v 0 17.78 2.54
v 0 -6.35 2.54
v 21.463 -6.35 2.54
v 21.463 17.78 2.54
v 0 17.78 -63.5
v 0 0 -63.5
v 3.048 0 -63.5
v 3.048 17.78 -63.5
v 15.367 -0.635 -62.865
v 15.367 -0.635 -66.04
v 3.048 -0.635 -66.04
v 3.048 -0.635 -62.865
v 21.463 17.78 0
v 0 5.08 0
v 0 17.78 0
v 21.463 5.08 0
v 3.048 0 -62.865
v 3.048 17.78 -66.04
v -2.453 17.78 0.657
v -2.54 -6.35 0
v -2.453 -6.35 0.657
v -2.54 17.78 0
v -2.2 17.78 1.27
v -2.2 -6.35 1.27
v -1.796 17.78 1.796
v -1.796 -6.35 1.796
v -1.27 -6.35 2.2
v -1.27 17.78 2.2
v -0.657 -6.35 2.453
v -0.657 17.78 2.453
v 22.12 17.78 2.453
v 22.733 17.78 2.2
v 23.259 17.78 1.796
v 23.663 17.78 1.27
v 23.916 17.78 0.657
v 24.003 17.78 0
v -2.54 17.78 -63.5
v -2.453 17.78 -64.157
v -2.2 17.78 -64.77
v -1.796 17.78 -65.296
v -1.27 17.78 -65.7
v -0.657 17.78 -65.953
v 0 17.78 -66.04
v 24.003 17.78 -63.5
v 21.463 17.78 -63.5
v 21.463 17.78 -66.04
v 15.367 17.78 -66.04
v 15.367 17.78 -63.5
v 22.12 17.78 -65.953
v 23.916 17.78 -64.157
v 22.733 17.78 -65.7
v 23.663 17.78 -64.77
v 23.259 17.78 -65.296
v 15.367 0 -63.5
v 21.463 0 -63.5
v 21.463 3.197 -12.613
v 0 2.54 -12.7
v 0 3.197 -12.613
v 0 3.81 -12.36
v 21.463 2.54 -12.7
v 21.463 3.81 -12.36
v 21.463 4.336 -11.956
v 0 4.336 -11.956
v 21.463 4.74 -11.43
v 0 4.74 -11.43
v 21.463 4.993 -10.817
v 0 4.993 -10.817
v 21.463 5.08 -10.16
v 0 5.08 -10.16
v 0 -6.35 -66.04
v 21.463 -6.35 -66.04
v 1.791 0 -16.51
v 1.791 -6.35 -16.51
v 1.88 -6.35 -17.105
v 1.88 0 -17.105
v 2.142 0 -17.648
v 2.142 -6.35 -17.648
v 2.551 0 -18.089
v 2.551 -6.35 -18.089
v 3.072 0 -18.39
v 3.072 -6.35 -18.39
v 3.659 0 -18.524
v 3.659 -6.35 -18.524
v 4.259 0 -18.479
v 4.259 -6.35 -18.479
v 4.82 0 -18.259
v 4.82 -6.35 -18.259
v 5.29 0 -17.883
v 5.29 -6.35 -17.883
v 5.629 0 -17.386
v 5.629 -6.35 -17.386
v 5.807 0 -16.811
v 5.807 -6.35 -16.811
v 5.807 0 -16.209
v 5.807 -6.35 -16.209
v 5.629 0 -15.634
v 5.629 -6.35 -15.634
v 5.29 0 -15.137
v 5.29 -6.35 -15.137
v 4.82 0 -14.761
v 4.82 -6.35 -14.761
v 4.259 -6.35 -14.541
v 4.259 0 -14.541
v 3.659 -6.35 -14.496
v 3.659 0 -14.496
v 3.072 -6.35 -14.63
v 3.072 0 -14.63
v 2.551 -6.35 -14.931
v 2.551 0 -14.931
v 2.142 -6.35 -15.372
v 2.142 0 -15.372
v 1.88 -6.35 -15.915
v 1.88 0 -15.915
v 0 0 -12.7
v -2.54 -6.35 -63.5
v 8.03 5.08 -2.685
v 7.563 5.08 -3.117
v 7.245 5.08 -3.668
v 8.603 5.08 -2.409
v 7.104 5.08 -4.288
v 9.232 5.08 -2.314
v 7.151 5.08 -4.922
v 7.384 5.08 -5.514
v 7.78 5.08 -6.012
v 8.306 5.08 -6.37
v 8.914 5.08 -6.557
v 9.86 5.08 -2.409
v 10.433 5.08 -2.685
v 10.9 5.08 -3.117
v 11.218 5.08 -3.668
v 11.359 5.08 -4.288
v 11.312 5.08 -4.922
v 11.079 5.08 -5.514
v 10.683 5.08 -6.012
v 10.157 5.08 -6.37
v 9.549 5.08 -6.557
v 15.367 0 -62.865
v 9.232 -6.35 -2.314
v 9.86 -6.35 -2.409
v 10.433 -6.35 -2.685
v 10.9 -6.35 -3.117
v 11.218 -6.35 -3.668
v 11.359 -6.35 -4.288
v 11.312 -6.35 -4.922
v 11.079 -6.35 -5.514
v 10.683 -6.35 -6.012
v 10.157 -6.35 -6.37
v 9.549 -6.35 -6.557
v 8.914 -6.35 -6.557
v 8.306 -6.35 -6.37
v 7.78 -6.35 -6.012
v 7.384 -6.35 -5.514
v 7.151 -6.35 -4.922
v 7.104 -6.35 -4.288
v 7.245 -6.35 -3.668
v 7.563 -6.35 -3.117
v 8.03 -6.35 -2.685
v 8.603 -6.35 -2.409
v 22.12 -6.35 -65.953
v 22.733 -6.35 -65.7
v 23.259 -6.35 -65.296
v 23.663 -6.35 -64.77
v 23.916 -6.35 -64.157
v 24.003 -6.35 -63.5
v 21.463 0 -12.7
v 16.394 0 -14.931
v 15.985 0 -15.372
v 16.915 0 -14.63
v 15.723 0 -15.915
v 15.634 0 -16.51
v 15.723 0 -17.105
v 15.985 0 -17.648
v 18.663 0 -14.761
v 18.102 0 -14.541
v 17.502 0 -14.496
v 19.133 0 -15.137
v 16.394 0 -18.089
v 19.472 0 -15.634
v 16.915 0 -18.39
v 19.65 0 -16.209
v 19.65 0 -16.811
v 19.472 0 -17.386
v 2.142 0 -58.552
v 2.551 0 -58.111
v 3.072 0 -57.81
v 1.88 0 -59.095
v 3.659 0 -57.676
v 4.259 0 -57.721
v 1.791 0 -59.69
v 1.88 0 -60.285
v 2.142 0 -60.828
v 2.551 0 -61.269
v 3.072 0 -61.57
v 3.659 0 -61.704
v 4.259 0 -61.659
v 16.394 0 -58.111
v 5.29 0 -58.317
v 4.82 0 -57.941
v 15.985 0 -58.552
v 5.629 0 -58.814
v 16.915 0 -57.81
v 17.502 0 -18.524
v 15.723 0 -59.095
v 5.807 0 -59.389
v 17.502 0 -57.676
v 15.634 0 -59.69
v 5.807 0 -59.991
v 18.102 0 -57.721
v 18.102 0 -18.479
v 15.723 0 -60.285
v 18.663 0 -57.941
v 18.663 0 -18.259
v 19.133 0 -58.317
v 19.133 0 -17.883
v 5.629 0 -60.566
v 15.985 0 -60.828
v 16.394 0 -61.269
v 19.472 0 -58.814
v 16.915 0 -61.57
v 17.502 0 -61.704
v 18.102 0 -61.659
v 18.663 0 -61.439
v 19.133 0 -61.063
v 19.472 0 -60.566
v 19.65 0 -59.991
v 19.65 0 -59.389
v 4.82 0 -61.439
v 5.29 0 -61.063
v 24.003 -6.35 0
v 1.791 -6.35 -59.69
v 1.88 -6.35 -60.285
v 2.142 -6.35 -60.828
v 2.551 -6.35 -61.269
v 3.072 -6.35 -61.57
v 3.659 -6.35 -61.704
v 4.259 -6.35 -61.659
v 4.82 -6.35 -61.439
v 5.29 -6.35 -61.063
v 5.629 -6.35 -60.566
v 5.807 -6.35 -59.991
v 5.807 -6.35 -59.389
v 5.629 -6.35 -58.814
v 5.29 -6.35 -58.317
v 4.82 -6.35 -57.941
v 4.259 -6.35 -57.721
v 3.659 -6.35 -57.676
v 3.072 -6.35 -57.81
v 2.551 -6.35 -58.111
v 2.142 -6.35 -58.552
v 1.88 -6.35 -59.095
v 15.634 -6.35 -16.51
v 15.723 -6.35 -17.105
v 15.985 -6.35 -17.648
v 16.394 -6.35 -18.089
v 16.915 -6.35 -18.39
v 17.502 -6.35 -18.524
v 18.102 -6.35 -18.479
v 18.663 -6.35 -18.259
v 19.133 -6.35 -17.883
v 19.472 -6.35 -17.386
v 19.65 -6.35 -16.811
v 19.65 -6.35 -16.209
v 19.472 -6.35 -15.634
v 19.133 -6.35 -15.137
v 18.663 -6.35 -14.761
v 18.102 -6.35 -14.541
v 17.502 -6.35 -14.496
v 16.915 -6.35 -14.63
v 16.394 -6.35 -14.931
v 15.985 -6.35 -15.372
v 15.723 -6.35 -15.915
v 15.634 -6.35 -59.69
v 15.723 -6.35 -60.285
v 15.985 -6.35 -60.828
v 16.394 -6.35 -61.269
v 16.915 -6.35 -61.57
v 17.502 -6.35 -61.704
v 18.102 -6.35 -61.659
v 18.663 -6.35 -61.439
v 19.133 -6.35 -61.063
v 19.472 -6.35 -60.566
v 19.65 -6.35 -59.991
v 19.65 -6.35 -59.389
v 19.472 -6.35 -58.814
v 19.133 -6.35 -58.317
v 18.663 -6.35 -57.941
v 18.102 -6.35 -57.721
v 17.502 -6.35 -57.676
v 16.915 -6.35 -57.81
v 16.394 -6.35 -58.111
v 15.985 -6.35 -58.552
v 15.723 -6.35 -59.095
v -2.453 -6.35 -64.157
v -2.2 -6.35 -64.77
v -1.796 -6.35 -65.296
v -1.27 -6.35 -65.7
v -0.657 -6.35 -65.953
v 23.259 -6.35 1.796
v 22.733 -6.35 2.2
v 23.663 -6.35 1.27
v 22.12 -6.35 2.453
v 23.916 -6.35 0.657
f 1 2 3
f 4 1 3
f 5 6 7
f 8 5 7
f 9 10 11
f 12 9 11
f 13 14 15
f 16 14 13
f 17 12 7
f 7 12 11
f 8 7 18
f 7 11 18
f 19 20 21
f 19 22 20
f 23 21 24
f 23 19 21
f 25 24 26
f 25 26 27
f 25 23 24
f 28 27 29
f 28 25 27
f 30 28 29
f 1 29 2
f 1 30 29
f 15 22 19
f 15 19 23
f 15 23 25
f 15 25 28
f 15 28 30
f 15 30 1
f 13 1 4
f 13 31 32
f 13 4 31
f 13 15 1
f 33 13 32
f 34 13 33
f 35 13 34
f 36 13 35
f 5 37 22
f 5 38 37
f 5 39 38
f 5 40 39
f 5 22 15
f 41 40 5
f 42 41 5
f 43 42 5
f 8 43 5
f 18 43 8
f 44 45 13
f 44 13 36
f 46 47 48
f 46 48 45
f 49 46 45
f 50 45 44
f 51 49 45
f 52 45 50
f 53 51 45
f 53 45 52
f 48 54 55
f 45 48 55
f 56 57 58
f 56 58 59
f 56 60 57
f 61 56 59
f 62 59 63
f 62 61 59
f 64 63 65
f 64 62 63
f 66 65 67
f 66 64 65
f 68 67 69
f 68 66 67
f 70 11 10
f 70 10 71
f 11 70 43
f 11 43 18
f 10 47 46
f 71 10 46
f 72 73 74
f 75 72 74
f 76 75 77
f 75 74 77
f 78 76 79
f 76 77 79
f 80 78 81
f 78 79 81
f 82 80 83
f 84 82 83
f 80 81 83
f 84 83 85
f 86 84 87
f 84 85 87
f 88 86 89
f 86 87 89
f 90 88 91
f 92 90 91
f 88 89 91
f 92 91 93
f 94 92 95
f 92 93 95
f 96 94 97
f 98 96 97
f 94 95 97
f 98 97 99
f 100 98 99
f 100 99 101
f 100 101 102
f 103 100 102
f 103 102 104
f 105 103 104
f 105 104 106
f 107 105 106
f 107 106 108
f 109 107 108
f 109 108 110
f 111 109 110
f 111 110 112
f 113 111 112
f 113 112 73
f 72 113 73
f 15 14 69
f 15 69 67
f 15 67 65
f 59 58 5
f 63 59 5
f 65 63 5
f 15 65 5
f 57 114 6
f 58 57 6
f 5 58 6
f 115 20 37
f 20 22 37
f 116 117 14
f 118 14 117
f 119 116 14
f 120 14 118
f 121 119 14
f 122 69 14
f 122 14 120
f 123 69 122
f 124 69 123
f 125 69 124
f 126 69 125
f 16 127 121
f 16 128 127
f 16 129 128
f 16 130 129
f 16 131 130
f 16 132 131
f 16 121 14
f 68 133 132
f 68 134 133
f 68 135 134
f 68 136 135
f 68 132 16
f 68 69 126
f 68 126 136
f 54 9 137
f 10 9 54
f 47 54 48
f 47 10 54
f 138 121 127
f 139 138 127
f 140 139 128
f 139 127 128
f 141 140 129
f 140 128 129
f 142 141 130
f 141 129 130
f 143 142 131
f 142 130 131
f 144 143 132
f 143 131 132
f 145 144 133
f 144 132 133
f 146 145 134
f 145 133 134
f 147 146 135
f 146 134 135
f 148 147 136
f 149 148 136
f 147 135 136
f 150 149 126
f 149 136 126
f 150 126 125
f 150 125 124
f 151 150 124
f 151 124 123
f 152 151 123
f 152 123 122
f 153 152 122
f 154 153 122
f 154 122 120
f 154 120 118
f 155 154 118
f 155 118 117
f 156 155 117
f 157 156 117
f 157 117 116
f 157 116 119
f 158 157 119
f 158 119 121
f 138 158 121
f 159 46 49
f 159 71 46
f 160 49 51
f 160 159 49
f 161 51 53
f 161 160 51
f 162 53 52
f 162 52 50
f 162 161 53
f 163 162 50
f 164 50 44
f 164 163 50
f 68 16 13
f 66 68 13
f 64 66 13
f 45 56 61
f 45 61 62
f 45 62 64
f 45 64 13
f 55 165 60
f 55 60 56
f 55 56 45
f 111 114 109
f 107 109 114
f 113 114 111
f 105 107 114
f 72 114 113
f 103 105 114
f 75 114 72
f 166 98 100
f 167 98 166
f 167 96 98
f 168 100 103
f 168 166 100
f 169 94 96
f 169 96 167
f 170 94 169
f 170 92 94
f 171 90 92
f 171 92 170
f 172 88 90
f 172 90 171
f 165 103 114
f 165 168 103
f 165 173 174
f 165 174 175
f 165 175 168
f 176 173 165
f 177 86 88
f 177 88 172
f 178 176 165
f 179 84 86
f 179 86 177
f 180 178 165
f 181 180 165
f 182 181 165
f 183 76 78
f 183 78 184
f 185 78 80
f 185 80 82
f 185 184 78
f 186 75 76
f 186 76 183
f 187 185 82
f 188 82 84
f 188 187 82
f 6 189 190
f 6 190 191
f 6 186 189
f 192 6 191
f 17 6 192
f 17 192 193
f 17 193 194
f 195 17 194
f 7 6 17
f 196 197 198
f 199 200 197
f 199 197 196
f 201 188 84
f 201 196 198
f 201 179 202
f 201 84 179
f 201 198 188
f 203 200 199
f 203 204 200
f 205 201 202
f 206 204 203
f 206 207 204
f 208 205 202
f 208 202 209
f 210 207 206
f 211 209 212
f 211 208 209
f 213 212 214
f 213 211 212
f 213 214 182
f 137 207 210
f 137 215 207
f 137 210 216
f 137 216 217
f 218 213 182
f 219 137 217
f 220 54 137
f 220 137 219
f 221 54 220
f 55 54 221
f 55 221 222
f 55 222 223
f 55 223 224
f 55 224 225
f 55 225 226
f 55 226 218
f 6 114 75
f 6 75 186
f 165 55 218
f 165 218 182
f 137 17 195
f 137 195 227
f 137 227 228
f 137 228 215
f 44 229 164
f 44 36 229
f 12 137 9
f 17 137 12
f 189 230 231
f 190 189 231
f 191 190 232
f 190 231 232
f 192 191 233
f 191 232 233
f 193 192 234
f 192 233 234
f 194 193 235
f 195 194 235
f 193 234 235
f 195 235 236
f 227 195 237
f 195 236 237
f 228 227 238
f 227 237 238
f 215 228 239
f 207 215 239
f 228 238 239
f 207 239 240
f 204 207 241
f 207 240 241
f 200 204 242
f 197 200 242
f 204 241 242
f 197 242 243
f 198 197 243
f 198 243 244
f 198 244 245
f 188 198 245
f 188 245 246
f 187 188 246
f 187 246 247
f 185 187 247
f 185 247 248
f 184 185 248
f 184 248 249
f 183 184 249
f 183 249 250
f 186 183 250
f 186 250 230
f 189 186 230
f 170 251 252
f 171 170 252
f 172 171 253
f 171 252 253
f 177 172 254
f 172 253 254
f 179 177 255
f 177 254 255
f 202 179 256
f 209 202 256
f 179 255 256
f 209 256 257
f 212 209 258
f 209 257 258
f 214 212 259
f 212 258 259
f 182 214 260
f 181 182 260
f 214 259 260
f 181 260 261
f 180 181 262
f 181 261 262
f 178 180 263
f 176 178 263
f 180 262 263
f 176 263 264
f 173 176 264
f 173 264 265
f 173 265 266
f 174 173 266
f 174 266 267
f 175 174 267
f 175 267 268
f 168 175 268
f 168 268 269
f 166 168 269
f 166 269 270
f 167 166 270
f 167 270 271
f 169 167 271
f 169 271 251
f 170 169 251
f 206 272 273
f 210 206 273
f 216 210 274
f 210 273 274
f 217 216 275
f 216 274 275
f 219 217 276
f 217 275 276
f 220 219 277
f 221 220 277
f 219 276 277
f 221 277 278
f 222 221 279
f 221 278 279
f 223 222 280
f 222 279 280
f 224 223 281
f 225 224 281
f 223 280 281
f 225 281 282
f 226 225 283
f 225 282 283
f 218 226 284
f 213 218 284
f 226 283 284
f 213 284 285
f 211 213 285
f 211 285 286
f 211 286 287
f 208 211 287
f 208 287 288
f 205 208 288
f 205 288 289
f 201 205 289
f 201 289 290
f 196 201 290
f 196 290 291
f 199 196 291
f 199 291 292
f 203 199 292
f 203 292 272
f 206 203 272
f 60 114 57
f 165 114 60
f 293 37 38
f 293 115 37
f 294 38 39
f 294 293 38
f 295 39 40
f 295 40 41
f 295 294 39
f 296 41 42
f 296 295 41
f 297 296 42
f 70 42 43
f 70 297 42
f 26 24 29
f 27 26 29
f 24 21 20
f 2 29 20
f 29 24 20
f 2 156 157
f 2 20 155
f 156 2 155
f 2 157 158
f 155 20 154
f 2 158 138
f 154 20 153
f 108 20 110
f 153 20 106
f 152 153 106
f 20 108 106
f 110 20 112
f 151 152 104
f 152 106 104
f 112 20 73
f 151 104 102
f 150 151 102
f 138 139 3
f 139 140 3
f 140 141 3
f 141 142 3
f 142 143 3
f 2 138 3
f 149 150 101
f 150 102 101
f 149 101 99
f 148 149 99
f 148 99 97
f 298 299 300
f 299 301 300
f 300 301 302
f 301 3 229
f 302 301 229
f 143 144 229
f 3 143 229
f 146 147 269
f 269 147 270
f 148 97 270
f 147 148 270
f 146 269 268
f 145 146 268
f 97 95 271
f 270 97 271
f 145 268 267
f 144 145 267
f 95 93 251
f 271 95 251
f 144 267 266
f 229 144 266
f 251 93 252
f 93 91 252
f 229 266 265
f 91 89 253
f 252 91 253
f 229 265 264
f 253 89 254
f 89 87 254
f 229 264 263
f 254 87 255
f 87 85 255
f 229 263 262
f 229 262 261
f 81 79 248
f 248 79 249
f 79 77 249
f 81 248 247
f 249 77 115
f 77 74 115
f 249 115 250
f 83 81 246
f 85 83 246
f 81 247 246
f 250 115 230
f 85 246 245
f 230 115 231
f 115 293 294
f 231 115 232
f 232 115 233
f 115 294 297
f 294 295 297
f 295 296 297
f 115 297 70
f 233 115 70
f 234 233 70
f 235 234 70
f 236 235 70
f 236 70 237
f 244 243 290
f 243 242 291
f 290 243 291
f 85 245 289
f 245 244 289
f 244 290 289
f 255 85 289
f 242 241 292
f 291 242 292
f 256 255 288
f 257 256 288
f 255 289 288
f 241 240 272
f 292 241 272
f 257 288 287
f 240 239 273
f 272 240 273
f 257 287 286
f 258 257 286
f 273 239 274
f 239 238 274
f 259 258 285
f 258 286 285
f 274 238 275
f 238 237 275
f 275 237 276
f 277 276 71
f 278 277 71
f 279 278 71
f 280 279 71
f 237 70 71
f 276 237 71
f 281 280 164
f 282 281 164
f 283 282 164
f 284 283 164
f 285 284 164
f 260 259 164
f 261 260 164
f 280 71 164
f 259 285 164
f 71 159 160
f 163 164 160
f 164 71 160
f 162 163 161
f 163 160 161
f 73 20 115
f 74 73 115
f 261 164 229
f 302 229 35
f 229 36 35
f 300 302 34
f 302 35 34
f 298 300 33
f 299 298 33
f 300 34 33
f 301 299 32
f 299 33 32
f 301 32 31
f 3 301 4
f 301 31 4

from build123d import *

# Parameters (mm, degrees)
SKETCH1_W                  = 26.543
SKETCH1_H                  = 68.58
SKETCH1_W_2                = 21.463
SKETCH1_H_2                = 63.5
BOSS_EXTRUDE1_DEPTH        = 17.78
SKETCH1_4_W                = 26.543
SKETCH1_4_H                = 68.58
BOSS_EXTRUDE2_DEPTH        = 6.35
SKETCH2_W                  = 12.319
SKETCH2_H                  = 18.415
CUT_EXTRUDE1_DEPTH         = 3.175
SKETCH3_W                  = 21.463
SKETCH3_H                  = 12.7
BOSS_EXTRUDE3_DEPTH        = 5.08
SKETCH4_R                  = 2.1336
CUT_EXTRUDE2_DEPTH         = 72.405291183
FILLET1_R                  = 2.54
F_10_32_TAPPED_HOLE1_D     = 4.0386
F_10_32_TAPPED_HOLE1_DEPTH = 12.0396
F_10_32_TAPPED_HOLE1_TIP   = 1.213317848


with BuildPart() as part:
    # Sketch1 → Boss-Extrude1 (new body)
    with BuildSketch(Plane(origin=(0, 0, 0), x_dir=(1, 0, 0), z_dir=(0, 1, 0))):
        with Locations((10.7315, 31.75)):
            Rectangle(SKETCH1_W, SKETCH1_H)
        with Locations((10.7315, 31.75)):
            Rectangle(SKETCH1_W_2, SKETCH1_H_2, mode=Mode.SUBTRACT)
    extrude(amount=BOSS_EXTRUDE1_DEPTH)

    # Sketch1<4> → Boss-Extrude2 (add)
    with BuildSketch(Plane(origin=(0, 0, 0), x_dir=(1, 0, 0), z_dir=(0, 1, 0))):
        with Locations((10.7315, 31.75)):
            Rectangle(SKETCH1_4_W, SKETCH1_4_H)
    extrude(amount=-BOSS_EXTRUDE2_DEPTH)

    # Sketch2 → Cut-Extrude1 (cut)
    with BuildSketch(Plane(origin=(0, 0, -66.04), x_dir=(-1, 0, 0), z_dir=(0, 0, -1))):
        with Locations((-9.2075, 8.5725)):
            Rectangle(SKETCH2_W, SKETCH2_H)
    extrude(amount=-CUT_EXTRUDE1_DEPTH, mode=Mode.SUBTRACT)

    # Sketch3 → Boss-Extrude3 (add)
    with BuildSketch(Plane(origin=(0, 0, 0), x_dir=(1, 0, 0), z_dir=(0, 1, 0))):
        with Locations((10.7315, 6.35)):
            Rectangle(SKETCH3_W, SKETCH3_H)
    extrude(amount=BOSS_EXTRUDE3_DEPTH)

    # Sketch4 → Cut-Extrude2 (cut, through all)
    with BuildSketch(Plane(origin=(0, 5.08, 0), x_dir=(1, 0, 0), z_dir=(0, 1, 0))):
        with Locations((9.2315, 4.447556381)):
            Circle(SKETCH4_R)
    extrude(amount=-CUT_EXTRUDE2_DEPTH, mode=Mode.SUBTRACT)

    # Fillet1
    fillet1_edges = [part.edges().sort_by_distance(p)[0] for p in [
        (24.003, 5.715, -66.04),
        (24.003, 5.715, 2.54),
        (-2.54, 5.715, 2.54),
        (-2.54, 5.715, -66.04),
        (10.7315, 5.08, -12.7),
    ]]
    fillet(fillet1_edges, radius=FILLET1_R)

    # #10-32 Tapped Hole1
    with Locations(Plane(origin=(0, 0, 0), x_dir=(1, 0, 0), z_dir=(0, 1, 0))):
        with Locations((3.81, 16.51), (17.653, 16.51), (17.653, 59.69), (3.81, 59.69)):
            Hole(F_10_32_TAPPED_HOLE1_D / 2, depth=F_10_32_TAPPED_HOLE1_DEPTH)
            with Locations((0, 0, -(F_10_32_TAPPED_HOLE1_DEPTH + F_10_32_TAPPED_HOLE1_TIP / 2))):  # 118° drill point
                Cone(0, F_10_32_TAPPED_HOLE1_D / 2, F_10_32_TAPPED_HOLE1_TIP, mode=Mode.SUBTRACT)


solid = part.part
